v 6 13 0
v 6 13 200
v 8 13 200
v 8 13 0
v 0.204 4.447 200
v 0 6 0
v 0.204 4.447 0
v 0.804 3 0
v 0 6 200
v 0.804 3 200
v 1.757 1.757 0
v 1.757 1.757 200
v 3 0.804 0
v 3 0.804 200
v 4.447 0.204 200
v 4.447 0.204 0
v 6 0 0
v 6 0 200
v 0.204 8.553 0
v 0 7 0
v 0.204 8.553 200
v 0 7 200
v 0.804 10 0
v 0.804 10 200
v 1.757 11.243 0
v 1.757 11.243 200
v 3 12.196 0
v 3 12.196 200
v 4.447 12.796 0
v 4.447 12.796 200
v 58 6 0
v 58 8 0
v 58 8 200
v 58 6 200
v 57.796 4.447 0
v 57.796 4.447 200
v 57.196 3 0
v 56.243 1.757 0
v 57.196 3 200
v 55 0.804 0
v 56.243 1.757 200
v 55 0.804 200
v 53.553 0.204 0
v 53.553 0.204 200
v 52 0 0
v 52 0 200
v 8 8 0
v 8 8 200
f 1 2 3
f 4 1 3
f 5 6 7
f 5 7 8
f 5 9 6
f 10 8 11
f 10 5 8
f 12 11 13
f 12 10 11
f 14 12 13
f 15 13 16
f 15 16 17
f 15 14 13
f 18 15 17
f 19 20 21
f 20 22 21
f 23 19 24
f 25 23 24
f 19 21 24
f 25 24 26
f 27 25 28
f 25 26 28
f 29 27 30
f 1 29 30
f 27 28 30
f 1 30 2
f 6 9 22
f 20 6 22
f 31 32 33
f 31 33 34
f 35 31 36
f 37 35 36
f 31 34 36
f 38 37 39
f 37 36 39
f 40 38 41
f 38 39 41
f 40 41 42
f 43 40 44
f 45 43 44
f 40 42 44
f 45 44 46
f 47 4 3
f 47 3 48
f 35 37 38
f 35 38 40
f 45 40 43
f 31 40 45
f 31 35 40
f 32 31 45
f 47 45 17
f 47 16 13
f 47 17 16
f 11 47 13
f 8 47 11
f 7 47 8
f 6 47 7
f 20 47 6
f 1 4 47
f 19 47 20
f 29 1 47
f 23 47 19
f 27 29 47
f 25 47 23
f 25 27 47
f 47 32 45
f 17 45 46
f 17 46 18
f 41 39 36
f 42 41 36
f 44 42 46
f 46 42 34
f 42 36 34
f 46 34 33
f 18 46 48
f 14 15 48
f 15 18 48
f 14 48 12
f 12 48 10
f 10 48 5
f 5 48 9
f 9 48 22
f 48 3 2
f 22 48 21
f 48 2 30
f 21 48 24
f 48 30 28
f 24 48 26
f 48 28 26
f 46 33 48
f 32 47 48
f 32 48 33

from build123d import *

# Parameters (mm, degrees)
PAD_DEPTH = 200
FILLET_R  = 6


with BuildPart() as part:
    # Sketch → Pad (new body)
    with BuildSketch(Plane.XY):
        Polygon((0, 0), (0, 13), (8, 13), (8, 8), (58, 8), (58, 0), align=None)
    extrude(amount=PAD_DEPTH)

    # Fillet
    fillet_edges = [part.edges().sort_by_distance(p)[0] for p in [
        (58, 0, 100),
        (0, 0, 100),
        (0, 13, 100),
    ]]
    fillet(fillet_edges, radius=FILLET_R)


solid = part.part
